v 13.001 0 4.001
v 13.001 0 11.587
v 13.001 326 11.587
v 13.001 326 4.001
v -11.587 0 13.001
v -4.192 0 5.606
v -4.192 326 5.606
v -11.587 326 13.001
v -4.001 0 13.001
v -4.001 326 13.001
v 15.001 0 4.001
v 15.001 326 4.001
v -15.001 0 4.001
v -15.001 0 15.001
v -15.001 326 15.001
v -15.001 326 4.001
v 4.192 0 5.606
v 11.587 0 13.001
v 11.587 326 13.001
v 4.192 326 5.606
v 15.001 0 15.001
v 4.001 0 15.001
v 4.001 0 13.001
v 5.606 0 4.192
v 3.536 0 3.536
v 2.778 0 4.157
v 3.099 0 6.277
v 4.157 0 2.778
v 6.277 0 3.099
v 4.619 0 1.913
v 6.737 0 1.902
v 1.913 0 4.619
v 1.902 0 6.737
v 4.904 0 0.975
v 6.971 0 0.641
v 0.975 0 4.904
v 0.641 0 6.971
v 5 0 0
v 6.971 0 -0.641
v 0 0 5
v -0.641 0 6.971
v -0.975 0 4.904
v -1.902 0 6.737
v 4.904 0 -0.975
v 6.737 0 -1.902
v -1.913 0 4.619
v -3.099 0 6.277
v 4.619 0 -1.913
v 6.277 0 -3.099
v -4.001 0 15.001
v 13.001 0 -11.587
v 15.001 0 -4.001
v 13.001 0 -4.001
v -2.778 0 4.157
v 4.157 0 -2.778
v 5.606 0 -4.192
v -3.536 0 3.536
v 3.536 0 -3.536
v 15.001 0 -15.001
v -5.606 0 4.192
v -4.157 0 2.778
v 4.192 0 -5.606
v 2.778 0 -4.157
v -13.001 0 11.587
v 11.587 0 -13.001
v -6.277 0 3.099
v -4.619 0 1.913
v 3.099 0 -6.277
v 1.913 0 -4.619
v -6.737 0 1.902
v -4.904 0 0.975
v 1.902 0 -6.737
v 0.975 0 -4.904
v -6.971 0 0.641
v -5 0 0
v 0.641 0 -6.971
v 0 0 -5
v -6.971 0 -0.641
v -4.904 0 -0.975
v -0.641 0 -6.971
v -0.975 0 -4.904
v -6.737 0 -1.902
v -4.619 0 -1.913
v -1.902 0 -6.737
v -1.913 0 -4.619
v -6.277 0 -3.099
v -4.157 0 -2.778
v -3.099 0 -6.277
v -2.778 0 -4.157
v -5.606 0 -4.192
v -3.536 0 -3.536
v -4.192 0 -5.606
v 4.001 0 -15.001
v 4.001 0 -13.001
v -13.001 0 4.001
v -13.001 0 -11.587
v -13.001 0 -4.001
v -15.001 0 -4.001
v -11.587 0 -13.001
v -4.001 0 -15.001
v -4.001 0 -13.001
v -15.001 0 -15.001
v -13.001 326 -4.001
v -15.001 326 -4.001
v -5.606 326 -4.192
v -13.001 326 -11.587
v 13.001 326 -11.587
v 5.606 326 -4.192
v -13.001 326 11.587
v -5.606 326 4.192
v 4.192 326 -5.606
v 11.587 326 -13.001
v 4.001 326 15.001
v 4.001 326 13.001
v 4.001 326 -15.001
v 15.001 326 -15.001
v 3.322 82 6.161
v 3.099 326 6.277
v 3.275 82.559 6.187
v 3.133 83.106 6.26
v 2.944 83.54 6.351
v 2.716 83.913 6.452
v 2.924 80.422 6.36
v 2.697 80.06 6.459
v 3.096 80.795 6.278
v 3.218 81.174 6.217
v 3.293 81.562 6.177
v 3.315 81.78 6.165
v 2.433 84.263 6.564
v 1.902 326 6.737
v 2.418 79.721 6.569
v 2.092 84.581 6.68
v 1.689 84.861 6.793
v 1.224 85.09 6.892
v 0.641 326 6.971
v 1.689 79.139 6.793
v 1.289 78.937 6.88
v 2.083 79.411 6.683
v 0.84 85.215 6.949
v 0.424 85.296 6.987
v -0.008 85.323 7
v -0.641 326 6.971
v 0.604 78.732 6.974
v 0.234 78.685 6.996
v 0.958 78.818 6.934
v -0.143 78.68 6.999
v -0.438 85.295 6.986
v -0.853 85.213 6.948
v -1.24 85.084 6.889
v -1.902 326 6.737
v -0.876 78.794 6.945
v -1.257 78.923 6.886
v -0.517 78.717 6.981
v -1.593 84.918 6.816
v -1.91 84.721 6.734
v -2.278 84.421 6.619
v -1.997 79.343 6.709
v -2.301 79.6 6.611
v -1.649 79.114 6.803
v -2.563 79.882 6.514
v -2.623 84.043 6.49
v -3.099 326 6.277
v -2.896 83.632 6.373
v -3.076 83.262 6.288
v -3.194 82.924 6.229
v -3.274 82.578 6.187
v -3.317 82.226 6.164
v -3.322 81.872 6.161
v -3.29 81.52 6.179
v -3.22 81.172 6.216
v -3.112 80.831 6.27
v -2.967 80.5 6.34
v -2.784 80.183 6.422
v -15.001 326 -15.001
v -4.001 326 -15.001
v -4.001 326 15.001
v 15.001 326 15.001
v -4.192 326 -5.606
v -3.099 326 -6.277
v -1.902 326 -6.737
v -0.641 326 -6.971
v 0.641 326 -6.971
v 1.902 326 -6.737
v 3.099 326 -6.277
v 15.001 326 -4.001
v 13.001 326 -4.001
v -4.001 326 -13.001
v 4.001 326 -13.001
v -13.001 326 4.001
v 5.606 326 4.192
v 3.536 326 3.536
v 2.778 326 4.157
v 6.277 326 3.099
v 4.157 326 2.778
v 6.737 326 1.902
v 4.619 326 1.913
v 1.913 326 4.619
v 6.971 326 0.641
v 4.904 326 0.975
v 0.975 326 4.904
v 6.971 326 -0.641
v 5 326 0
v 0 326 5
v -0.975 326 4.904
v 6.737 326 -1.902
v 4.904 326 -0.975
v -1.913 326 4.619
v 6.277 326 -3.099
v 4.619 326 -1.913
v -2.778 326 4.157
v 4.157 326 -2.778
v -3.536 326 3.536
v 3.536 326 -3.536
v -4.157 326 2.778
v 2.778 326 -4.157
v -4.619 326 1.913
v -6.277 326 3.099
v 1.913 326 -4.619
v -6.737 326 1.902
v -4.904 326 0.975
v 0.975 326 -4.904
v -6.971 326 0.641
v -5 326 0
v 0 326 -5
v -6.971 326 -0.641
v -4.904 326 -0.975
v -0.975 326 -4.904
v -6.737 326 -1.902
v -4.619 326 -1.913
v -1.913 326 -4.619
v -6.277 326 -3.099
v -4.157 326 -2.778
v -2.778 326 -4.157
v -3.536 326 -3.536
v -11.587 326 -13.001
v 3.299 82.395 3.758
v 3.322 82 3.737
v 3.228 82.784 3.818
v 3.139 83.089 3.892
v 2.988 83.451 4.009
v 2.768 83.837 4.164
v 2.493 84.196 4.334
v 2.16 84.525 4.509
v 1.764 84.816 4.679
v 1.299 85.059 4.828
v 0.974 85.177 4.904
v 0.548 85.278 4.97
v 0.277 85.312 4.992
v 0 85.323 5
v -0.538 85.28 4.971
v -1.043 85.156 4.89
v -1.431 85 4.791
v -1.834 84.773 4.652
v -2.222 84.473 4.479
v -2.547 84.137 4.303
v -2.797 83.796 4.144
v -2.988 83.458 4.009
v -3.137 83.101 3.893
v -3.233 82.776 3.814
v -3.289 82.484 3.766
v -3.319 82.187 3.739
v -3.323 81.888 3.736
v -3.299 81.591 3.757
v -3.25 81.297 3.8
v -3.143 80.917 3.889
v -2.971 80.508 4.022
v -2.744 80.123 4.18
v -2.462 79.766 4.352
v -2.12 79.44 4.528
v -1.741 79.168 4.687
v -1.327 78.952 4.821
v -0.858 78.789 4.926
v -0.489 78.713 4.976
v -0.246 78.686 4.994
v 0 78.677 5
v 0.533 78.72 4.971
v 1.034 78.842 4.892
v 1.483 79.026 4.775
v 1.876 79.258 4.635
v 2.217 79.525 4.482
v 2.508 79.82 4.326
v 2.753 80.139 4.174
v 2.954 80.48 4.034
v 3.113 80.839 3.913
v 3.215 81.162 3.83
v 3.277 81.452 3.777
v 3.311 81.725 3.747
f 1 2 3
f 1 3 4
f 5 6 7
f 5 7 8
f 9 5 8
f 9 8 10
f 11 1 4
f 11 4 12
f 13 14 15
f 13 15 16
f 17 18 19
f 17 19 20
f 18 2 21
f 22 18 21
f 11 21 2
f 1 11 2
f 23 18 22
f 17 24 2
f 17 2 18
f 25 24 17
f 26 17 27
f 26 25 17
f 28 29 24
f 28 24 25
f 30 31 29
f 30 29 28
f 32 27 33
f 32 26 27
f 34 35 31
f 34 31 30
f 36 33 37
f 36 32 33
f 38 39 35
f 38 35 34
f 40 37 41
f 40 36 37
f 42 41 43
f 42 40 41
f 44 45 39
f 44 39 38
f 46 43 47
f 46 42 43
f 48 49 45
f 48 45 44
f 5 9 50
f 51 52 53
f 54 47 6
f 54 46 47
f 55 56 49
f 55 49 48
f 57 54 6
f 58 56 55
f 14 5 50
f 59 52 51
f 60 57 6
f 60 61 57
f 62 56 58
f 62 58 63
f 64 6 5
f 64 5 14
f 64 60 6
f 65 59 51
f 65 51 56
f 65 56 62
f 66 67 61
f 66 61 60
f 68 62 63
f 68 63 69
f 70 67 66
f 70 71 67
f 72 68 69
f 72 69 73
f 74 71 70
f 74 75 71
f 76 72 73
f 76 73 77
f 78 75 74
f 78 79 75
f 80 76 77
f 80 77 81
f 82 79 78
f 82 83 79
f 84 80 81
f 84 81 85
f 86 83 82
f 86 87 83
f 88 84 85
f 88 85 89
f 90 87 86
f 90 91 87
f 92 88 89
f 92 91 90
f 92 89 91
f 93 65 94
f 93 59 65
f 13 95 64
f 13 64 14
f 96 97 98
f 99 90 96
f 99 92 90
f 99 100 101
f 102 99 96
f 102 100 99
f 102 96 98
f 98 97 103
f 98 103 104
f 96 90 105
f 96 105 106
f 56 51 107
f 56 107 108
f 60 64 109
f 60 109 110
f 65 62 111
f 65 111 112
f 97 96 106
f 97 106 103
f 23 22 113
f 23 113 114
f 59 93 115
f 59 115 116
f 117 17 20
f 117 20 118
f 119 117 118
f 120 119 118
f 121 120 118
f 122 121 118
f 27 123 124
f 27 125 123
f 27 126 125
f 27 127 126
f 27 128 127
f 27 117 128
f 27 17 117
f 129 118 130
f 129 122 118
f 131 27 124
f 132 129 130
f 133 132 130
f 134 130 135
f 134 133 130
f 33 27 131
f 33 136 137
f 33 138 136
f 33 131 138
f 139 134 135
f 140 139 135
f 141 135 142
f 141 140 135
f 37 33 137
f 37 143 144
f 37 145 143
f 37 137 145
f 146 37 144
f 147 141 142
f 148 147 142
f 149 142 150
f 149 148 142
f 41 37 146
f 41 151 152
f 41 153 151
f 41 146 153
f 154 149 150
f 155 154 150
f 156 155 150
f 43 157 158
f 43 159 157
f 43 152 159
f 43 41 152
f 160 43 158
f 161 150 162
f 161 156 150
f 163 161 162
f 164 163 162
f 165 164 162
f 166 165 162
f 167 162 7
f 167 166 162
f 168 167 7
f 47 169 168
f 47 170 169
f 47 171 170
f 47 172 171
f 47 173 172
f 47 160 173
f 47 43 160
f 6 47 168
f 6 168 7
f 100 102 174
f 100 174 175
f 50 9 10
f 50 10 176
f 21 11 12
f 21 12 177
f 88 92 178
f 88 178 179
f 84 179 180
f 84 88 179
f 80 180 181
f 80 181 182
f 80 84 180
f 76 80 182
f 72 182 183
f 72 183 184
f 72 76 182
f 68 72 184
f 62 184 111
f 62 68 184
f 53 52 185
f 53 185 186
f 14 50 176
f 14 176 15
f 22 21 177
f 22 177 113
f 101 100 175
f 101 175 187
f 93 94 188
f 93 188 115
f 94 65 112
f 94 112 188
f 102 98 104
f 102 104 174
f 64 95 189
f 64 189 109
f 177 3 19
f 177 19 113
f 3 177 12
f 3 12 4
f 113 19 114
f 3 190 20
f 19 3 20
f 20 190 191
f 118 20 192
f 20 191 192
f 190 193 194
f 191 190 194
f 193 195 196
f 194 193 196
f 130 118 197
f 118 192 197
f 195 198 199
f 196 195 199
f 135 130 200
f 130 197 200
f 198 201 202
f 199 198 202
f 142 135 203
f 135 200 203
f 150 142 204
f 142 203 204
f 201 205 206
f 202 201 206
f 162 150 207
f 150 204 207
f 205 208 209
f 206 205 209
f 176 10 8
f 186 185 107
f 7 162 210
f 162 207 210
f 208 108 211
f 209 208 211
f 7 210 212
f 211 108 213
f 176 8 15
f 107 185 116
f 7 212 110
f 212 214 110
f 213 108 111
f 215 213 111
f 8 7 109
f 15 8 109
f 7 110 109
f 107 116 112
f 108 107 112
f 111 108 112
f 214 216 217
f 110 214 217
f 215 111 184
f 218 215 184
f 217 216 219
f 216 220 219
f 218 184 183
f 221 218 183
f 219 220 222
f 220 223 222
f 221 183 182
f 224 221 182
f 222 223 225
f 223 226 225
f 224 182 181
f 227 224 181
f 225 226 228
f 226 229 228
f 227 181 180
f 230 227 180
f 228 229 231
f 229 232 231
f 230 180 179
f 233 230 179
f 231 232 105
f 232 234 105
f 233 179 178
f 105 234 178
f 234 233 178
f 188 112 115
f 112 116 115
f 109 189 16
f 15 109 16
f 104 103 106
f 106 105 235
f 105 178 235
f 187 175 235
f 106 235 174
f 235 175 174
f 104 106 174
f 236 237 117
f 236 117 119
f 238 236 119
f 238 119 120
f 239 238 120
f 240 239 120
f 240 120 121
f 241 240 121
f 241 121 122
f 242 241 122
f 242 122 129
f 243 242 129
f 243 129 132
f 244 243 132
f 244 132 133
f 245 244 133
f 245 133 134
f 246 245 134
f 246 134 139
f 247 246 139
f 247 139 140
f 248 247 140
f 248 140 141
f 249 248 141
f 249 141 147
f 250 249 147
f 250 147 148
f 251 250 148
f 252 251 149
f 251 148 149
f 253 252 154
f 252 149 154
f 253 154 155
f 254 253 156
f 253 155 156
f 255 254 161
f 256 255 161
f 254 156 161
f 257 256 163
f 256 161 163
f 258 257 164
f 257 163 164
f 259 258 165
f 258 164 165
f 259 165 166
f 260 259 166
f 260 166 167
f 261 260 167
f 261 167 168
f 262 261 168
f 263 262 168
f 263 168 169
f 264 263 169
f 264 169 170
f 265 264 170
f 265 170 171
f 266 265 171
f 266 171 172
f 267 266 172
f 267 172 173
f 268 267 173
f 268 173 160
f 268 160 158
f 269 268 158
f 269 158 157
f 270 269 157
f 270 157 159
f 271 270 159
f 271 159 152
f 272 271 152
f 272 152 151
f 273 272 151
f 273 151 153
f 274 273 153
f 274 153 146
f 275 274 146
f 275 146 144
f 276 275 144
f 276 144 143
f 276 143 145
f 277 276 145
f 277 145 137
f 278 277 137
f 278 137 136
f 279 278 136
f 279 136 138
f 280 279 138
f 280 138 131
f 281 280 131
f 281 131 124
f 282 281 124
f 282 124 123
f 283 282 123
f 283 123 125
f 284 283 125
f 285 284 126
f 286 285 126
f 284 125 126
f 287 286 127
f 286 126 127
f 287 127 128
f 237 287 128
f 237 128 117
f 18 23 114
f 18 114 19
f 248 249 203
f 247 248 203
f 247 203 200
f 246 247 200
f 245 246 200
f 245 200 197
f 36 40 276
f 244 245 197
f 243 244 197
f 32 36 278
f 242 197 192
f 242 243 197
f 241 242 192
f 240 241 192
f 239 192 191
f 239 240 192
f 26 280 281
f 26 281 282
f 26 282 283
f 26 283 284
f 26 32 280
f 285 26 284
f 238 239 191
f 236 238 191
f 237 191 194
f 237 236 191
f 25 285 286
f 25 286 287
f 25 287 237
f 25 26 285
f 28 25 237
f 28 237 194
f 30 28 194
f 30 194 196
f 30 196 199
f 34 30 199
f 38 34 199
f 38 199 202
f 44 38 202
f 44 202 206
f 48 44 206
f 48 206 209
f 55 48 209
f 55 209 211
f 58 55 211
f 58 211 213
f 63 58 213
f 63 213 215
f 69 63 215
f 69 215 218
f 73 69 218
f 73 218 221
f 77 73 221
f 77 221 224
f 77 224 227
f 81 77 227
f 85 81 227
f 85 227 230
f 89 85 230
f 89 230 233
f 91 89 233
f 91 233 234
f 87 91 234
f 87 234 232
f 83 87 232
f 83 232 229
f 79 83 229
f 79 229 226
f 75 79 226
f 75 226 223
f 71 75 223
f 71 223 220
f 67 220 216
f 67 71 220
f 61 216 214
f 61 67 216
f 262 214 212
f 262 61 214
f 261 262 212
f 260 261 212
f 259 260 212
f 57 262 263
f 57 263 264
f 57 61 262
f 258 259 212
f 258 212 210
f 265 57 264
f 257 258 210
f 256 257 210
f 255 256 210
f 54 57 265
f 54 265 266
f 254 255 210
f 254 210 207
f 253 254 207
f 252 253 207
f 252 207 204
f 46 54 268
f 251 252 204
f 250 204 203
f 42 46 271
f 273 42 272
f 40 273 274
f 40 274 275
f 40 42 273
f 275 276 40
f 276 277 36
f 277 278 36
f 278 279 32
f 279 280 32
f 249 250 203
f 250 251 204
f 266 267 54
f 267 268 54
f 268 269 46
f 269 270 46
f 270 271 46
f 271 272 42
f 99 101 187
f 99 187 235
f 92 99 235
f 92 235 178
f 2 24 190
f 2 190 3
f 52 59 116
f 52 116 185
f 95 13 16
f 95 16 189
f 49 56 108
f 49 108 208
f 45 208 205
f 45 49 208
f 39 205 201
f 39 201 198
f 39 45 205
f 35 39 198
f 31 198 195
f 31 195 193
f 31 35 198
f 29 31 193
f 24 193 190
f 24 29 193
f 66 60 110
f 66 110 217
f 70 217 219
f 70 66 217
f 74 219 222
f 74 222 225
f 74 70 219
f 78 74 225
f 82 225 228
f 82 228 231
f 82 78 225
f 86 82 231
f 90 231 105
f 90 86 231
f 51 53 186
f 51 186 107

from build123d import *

# Parameters (mm, degrees)
SKETCH1_R               = 5
BOSS_EXTRUDE1_DEPTH     = 326
CUT_EXTRUDE1_REACH      = 329.721
CUT_EXTRUDE1_END_RADIUS = 5
SKETCH2_R               = 3.3234375


with BuildPart() as part:
    # Sketch1 → Boss-Extrude1 (new body)
    with BuildSketch(Plane(origin=(0, 0, 0), x_dir=(1, 0, 0), z_dir=(0, 1, 0))):
        with BuildLine():
            Line((4.191872704, 5.606086267), (11.5870568, 13.001270363))
            Line((11.5870568, 13.001270363), (4.001270363, 13.001270363))
            Line((4.001270363, 13.001270363), (4.001270363, 15.001270363))
            Line((4.001270363, 15.001270363), (15.001270363, 15.001270363))
            Line((15.001270363, 15.001270363), (15.001270363, 4.001270363))
            Line((15.001270363, 4.001270363), (13.001270363, 4.001270363))
            Line((13.001270363, 4.001270363), (13.001270363, 11.5870568))
            Line((13.001270363, 11.5870568), (5.606086267, 4.191872704))
            ThreePointArc((5.606086267, 4.191872704), (7, 0), (5.606086267, -4.191872704))
            Line((5.606086267, -4.191872704), (13.001270363, -11.5870568))
            Line((13.001270363, -11.5870568), (13.001270363, -4.001270363))
            Line((13.001270363, -4.001270363), (15.001270363, -4.001270363))
            Line((15.001270363, -4.001270363), (15.001270363, -15.001270363))
            Line((15.001270363, -15.001270363), (4.001270363, -15.001270363))
            Line((4.001270363, -15.001270363), (4.001270363, -13.001270363))
            Line((4.001270363, -13.001270363), (11.5870568, -13.001270363))
            Line((11.5870568, -13.001270363), (4.191872704, -5.606086267))
            ThreePointArc((4.191872704, -5.606086267), (0, -7), (-4.191872704, -5.606086267))
            Line((-4.191872704, -5.606086267), (-11.5870568, -13.001270363))
            Line((-11.5870568, -13.001270363), (-4.001270363, -13.001270363))
            Line((-4.001270363, -13.001270363), (-4.001270363, -15.001270363))
            Line((-4.001270363, -15.001270363), (-15.001270363, -15.001270363))
            Line((-15.001270363, -15.001270363), (-15.001270363, -4.001270363))
            Line((-15.001270363, -4.001270363), (-13.001270363, -4.001270363))
            Line((-13.001270363, -4.001270363), (-13.001270363, -11.5870568))
            Line((-13.001270363, -11.5870568), (-5.606086267, -4.191872704))
            ThreePointArc((-5.606086267, -4.191872704), (-7, 0), (-5.606086267, 4.191872704))
            Line((-5.606086267, 4.191872704), (-13.001270363, 11.5870568))
            Line((-13.001270363, 11.5870568), (-13.001270363, 4.001270363))
            Line((-13.001270363, 4.001270363), (-15.001270363, 4.001270363))
            Line((-15.001270363, 4.001270363), (-15.001270363, 15.001270363))
            Line((-15.001270363, 15.001270363), (-4.001270363, 15.001270363))
            Line((-4.001270363, 15.001270363), (-4.001270363, 13.001270363))
            Line((-4.001270363, 13.001270363), (-11.5870568, 13.001270363))
            Line((-11.5870568, 13.001270363), (-4.191872704, 5.606086267))
            ThreePointArc((-4.191872704, 5.606086267), (0, 7), (4.191872704, 5.606086267))
        make_face()
        with Locations(Location((0, 0, 0), (0, 0, 270))):
            Circle(SKETCH1_R, mode=Mode.SUBTRACT)
    extrude(amount=BOSS_EXTRUDE1_DEPTH)

    # Cut-Extrude1: up to this cylinder (the profile starts outside it)
    cut_extrude1_end = Plane(origin=(0, 82, 0), z_dir=(0, -1, 0)) * Cylinder(CUT_EXTRUDE1_END_RADIUS, 670.442, mode=Mode.PRIVATE)
    # Sketch2 → Cut-Extrude1 (cut, up to the surface)
    with BuildSketch(Plane.XY.offset(15.001270363), mode=Mode.PRIVATE) as cut_extrude1_sk1:
        with Locations((-0.001270363, 82)):
            Circle(SKETCH2_R)
    cut_extrude1_tool1 = extrude(cut_extrude1_sk1.sketch, amount=-CUT_EXTRUDE1_REACH, mode=Mode.PRIVATE) - cut_extrude1_end
    add(cut_extrude1_tool1.solids().sort_by_distance((-0.00127, 82, 15.00127))[0], mode=Mode.SUBTRACT)


solid = part.part
